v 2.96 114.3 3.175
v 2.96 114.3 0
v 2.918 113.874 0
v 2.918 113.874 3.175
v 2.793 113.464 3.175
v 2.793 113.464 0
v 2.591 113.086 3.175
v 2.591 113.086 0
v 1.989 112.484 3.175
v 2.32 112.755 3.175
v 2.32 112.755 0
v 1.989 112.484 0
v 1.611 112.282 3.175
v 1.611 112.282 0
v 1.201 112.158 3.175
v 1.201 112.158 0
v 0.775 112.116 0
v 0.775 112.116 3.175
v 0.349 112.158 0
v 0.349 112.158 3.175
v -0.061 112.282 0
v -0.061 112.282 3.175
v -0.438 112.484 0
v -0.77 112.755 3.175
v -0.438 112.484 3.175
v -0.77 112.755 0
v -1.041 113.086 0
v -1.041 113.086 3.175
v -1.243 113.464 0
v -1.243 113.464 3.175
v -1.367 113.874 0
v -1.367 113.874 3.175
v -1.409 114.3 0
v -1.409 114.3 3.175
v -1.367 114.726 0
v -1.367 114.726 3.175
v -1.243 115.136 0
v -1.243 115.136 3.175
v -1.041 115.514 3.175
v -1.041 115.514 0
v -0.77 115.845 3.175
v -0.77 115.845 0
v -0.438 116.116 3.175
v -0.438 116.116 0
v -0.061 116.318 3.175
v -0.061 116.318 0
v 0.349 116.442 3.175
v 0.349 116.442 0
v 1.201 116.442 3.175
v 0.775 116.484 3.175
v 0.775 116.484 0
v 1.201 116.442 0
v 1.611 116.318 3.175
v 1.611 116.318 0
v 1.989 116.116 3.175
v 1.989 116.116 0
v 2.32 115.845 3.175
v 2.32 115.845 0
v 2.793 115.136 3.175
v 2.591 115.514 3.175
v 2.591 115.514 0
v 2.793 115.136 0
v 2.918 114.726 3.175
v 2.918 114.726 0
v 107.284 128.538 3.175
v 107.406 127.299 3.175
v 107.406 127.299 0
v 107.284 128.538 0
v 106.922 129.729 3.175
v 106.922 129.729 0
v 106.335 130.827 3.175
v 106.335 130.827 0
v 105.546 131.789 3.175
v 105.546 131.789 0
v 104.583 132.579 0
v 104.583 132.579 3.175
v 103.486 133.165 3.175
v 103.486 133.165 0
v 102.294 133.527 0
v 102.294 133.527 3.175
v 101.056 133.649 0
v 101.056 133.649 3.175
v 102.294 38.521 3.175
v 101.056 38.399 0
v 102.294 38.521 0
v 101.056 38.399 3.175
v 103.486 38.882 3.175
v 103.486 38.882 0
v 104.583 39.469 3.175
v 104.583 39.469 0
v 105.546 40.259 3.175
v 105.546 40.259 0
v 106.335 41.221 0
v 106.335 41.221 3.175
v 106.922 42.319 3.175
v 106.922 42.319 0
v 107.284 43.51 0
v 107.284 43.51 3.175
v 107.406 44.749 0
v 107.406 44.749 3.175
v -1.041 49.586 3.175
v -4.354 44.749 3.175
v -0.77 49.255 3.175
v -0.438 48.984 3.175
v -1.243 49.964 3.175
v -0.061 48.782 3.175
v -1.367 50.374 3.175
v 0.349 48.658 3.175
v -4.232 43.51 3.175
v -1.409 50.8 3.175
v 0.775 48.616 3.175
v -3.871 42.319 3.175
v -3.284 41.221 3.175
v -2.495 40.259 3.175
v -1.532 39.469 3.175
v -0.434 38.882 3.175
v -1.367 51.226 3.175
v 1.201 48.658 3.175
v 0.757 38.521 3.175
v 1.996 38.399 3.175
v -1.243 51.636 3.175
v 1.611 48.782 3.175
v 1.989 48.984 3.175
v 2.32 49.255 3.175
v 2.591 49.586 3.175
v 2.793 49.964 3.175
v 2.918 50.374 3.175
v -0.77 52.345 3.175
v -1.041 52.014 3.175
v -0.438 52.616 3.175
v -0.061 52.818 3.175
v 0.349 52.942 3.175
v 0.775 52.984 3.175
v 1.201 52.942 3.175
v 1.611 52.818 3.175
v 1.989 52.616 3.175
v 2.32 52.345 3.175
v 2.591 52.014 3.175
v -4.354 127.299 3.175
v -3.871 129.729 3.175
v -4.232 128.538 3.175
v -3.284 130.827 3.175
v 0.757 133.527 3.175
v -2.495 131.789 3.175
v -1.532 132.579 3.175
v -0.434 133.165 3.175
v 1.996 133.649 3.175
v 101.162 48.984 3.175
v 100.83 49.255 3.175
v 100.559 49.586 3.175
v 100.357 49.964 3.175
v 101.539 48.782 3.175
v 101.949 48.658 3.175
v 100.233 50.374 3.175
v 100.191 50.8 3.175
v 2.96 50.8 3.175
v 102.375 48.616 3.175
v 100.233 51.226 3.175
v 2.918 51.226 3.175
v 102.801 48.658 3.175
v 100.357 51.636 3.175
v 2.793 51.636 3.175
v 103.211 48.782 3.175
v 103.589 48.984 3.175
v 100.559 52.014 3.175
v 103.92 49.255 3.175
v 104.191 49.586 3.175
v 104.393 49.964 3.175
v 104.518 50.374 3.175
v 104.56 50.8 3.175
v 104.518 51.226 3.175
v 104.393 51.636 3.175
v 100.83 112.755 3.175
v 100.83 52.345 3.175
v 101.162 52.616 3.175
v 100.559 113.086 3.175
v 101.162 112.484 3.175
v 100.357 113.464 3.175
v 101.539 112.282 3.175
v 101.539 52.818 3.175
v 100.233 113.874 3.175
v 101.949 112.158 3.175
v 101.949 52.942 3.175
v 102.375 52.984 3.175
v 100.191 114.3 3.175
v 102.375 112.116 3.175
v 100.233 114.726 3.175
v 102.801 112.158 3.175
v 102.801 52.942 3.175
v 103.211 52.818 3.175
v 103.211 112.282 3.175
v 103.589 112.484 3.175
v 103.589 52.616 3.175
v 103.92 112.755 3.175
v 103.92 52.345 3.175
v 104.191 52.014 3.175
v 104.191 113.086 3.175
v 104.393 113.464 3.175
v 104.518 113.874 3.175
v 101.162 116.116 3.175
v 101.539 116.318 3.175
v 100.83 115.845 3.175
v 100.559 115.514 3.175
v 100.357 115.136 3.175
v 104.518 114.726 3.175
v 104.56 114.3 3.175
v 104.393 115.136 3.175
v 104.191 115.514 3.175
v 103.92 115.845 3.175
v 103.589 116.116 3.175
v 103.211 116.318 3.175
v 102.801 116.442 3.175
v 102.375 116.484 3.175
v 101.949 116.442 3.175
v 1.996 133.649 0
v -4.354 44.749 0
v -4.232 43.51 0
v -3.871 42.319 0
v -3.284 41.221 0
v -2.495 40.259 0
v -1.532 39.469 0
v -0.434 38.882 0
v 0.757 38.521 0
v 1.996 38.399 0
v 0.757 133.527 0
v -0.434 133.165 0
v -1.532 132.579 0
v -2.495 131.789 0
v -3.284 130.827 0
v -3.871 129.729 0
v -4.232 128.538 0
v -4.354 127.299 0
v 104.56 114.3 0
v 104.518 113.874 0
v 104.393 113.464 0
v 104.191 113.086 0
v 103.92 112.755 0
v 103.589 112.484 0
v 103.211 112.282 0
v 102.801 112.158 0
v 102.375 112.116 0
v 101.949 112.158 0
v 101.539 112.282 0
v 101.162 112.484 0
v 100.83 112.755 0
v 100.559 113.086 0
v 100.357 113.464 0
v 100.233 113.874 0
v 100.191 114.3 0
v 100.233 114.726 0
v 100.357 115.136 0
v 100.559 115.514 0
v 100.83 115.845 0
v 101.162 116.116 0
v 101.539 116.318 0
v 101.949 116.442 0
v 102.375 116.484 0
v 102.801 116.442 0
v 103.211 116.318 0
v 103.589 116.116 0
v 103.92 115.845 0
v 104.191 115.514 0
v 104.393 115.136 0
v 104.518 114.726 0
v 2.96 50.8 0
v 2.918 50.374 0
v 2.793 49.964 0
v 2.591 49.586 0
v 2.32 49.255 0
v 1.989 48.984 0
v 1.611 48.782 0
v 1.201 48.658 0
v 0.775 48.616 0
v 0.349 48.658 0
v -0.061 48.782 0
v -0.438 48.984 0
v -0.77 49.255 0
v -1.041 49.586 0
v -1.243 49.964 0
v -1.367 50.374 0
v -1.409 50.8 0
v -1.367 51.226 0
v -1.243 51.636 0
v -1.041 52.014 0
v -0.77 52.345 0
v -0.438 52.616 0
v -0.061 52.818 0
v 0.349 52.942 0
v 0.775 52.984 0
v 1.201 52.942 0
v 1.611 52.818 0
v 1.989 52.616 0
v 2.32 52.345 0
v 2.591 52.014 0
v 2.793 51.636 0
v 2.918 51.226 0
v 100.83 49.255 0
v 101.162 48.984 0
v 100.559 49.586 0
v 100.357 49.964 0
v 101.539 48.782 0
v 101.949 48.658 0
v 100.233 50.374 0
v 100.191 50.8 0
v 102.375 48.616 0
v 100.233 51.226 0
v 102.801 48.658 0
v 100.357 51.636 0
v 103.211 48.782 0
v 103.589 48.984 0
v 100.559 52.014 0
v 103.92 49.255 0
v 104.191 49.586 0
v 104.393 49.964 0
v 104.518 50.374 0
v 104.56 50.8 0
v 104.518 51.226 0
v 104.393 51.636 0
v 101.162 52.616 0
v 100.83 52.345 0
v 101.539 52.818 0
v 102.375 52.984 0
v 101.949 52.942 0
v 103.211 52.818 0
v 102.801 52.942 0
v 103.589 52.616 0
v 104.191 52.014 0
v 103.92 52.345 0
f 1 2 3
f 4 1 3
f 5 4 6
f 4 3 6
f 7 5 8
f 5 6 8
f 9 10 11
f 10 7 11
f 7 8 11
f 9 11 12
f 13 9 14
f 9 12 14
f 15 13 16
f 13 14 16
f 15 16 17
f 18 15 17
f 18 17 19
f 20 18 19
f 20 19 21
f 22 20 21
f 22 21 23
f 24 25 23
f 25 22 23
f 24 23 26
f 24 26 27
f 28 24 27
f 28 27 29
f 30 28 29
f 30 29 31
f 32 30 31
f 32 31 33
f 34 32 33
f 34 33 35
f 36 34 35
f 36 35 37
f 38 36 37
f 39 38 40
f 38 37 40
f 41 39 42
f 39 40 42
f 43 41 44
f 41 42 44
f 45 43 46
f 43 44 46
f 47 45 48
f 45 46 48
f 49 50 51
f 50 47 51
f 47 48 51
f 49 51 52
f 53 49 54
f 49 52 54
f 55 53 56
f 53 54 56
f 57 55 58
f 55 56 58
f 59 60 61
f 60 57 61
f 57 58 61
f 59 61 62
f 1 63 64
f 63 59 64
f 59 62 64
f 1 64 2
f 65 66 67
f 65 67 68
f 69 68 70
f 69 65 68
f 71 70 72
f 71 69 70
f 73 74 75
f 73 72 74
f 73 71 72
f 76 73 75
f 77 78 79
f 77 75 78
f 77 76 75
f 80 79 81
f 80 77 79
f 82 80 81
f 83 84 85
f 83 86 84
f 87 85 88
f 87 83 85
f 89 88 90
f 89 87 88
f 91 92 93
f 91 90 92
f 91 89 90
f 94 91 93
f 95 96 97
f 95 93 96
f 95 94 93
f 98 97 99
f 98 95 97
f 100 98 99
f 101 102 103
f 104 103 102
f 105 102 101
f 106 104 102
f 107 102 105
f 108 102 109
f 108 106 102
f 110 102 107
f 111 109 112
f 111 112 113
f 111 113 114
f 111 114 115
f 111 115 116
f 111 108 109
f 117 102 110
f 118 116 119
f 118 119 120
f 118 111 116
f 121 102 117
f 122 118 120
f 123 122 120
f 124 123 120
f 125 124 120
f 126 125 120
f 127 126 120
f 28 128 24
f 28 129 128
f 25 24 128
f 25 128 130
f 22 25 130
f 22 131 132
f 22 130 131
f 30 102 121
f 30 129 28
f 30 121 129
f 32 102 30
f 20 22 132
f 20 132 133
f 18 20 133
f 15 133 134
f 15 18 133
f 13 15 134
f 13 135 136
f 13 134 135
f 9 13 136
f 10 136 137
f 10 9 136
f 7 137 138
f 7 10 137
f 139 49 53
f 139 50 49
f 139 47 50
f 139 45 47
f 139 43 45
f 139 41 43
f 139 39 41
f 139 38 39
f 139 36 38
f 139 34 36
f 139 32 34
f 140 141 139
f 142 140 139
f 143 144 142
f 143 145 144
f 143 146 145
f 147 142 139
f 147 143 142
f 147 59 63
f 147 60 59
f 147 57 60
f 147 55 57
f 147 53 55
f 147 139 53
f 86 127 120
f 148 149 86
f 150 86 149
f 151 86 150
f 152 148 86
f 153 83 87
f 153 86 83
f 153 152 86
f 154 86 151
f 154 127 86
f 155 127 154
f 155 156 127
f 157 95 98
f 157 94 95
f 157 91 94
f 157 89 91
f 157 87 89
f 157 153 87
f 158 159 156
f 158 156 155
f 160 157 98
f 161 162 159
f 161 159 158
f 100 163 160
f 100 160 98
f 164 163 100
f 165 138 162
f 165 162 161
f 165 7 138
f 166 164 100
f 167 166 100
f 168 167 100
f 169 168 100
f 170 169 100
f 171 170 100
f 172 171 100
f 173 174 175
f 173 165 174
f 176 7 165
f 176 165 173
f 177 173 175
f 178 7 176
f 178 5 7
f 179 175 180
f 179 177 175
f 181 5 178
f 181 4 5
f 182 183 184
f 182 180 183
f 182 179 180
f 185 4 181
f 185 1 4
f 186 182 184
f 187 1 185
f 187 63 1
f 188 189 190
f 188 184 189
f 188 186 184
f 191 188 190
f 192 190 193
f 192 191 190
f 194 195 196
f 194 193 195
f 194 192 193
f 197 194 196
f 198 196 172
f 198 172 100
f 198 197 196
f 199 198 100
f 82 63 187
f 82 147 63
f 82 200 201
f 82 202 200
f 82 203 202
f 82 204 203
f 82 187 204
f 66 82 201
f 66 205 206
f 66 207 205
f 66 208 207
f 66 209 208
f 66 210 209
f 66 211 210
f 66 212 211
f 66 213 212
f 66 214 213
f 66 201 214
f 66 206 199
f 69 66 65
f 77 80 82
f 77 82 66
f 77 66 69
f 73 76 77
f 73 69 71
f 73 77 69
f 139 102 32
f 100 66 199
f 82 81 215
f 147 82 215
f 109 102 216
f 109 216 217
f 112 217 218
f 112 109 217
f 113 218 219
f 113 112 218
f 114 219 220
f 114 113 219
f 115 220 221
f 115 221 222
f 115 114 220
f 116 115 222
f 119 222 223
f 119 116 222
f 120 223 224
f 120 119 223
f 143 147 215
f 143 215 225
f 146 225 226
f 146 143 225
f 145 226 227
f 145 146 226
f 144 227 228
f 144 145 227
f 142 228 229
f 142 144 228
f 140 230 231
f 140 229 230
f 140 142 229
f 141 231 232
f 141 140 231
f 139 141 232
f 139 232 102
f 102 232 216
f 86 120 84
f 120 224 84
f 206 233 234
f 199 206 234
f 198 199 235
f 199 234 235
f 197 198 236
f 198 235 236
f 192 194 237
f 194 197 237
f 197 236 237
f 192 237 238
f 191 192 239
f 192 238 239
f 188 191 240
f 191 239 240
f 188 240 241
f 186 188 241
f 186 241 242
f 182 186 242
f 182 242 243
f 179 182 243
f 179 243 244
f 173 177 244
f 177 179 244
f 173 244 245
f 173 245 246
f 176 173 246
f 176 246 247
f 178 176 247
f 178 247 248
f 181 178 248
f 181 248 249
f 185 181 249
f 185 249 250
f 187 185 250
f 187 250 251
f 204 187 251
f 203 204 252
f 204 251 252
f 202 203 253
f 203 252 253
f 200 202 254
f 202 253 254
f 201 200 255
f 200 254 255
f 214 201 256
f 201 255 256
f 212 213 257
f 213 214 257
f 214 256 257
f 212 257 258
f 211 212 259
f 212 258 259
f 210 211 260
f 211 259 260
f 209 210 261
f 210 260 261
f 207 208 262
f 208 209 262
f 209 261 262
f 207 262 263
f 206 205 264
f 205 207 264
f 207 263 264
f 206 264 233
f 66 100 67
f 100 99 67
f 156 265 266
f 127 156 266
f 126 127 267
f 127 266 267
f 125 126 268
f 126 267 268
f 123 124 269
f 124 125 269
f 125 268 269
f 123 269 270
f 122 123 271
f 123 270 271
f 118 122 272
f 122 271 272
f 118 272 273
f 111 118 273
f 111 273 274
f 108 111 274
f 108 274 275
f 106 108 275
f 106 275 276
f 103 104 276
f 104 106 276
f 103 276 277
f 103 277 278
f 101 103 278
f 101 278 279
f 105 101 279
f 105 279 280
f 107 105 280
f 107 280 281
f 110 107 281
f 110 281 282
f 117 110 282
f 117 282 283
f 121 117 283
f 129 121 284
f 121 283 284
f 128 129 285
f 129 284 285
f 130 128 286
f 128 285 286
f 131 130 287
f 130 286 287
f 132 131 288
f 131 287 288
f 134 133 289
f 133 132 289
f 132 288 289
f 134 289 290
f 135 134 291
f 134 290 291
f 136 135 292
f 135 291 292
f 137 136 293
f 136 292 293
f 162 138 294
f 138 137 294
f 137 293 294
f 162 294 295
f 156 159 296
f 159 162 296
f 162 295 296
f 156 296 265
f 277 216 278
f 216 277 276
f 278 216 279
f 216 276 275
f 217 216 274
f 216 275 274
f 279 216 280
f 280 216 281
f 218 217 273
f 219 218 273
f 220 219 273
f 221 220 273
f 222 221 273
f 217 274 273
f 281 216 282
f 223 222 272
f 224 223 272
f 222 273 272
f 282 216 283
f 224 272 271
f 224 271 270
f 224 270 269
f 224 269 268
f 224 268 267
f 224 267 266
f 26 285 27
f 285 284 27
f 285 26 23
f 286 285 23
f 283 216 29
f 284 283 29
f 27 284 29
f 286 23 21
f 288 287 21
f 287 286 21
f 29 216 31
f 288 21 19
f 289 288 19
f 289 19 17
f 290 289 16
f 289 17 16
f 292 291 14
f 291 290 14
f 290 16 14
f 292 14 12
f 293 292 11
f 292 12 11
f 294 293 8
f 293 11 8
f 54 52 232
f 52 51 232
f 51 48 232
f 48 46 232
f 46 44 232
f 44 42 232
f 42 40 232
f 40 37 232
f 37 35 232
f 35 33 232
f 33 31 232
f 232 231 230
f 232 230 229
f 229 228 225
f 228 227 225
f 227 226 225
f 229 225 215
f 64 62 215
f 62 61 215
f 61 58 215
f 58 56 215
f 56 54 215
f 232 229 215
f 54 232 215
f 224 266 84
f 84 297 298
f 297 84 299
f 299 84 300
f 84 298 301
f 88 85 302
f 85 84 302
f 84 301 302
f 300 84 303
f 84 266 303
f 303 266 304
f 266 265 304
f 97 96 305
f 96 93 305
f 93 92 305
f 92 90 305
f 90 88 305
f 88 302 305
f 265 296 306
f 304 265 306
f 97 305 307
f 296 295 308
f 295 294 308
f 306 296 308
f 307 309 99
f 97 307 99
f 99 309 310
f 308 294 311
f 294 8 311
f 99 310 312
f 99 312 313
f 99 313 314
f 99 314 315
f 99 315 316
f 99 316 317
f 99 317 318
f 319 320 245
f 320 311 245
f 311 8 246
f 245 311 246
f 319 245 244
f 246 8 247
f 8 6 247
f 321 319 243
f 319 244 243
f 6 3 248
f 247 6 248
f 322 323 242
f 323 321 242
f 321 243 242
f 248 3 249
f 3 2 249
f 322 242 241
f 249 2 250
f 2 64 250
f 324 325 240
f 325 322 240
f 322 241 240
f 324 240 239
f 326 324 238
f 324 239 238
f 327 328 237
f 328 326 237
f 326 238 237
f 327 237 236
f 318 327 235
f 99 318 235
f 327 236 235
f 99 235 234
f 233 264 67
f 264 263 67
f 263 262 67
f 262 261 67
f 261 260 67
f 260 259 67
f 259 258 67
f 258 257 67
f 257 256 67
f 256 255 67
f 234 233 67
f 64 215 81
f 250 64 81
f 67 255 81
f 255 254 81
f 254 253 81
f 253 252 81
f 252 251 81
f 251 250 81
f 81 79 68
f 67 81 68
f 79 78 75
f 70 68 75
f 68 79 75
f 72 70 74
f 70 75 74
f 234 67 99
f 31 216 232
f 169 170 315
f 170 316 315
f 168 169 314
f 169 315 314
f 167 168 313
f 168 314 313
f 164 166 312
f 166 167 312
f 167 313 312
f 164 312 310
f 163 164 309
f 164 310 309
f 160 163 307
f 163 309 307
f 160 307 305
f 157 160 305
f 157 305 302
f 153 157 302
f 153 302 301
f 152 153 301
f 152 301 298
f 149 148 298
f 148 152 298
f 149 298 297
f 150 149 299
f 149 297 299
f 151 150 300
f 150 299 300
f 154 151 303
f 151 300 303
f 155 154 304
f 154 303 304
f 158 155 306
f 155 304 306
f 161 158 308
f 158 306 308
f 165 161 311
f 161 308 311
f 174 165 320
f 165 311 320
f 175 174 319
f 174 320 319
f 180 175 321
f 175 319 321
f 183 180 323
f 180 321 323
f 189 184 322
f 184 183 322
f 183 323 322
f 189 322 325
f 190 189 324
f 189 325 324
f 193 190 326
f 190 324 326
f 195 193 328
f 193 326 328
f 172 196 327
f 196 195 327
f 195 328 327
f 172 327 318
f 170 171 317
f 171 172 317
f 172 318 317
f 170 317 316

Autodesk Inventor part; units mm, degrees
ref_plane "YZ Plane" through (0, 0, 0) normal (1, 0, 0) x (0, 1, 0)
ref_plane "XZ Plane" through (0, 0, 0) normal (0, 1, 0) x (-1, 0, 0)
ref_plane "Work Plane1" through (0, 0, 0) normal (0, 0, 1) x (1, 0, 0)
sketch "Sketch1" plane through (0, 0, 0) normal (0, 0, 1) x (1, 0, 0)
  line L0 (-4.3544, 38.3987) -> (107.4056, 38.3987)
  line L1 (107.4056, 38.3987) -> (107.4056, 133.6487)
  line L2 (107.4056, 133.6487) -> (-4.3544, 133.6487)
  line L3 (-4.3544, 133.6487) -> (-4.3544, 38.3987)
  circle A0 centre (0.7751, 50.8) radius 2.1844
  circle A1 centre (102.3751, 50.8) radius 2.1844
  circle A2 centre (0.7751, 114.3) radius 2.1844
  circle A3 centre (102.3751, 114.3) radius 2.1844
  point P0 (0, 0)
  dimension "d0" = 111.76
  dimension "d1" = 95.25
extrude "Extrusion1" add sketch "Sketch1" along normal blind 3.175
fillet "Fillet1" radius 6.35 4 edges at (-4.3544, 38.3987, 1.5875) (107.4056, 38.3987, 1.5875) (-4.3544, 133.6487, 1.5875) (107.4056, 133.6487, 1.5875)
properties part number "Poly3" material "Polycarbonate, Smoke"
